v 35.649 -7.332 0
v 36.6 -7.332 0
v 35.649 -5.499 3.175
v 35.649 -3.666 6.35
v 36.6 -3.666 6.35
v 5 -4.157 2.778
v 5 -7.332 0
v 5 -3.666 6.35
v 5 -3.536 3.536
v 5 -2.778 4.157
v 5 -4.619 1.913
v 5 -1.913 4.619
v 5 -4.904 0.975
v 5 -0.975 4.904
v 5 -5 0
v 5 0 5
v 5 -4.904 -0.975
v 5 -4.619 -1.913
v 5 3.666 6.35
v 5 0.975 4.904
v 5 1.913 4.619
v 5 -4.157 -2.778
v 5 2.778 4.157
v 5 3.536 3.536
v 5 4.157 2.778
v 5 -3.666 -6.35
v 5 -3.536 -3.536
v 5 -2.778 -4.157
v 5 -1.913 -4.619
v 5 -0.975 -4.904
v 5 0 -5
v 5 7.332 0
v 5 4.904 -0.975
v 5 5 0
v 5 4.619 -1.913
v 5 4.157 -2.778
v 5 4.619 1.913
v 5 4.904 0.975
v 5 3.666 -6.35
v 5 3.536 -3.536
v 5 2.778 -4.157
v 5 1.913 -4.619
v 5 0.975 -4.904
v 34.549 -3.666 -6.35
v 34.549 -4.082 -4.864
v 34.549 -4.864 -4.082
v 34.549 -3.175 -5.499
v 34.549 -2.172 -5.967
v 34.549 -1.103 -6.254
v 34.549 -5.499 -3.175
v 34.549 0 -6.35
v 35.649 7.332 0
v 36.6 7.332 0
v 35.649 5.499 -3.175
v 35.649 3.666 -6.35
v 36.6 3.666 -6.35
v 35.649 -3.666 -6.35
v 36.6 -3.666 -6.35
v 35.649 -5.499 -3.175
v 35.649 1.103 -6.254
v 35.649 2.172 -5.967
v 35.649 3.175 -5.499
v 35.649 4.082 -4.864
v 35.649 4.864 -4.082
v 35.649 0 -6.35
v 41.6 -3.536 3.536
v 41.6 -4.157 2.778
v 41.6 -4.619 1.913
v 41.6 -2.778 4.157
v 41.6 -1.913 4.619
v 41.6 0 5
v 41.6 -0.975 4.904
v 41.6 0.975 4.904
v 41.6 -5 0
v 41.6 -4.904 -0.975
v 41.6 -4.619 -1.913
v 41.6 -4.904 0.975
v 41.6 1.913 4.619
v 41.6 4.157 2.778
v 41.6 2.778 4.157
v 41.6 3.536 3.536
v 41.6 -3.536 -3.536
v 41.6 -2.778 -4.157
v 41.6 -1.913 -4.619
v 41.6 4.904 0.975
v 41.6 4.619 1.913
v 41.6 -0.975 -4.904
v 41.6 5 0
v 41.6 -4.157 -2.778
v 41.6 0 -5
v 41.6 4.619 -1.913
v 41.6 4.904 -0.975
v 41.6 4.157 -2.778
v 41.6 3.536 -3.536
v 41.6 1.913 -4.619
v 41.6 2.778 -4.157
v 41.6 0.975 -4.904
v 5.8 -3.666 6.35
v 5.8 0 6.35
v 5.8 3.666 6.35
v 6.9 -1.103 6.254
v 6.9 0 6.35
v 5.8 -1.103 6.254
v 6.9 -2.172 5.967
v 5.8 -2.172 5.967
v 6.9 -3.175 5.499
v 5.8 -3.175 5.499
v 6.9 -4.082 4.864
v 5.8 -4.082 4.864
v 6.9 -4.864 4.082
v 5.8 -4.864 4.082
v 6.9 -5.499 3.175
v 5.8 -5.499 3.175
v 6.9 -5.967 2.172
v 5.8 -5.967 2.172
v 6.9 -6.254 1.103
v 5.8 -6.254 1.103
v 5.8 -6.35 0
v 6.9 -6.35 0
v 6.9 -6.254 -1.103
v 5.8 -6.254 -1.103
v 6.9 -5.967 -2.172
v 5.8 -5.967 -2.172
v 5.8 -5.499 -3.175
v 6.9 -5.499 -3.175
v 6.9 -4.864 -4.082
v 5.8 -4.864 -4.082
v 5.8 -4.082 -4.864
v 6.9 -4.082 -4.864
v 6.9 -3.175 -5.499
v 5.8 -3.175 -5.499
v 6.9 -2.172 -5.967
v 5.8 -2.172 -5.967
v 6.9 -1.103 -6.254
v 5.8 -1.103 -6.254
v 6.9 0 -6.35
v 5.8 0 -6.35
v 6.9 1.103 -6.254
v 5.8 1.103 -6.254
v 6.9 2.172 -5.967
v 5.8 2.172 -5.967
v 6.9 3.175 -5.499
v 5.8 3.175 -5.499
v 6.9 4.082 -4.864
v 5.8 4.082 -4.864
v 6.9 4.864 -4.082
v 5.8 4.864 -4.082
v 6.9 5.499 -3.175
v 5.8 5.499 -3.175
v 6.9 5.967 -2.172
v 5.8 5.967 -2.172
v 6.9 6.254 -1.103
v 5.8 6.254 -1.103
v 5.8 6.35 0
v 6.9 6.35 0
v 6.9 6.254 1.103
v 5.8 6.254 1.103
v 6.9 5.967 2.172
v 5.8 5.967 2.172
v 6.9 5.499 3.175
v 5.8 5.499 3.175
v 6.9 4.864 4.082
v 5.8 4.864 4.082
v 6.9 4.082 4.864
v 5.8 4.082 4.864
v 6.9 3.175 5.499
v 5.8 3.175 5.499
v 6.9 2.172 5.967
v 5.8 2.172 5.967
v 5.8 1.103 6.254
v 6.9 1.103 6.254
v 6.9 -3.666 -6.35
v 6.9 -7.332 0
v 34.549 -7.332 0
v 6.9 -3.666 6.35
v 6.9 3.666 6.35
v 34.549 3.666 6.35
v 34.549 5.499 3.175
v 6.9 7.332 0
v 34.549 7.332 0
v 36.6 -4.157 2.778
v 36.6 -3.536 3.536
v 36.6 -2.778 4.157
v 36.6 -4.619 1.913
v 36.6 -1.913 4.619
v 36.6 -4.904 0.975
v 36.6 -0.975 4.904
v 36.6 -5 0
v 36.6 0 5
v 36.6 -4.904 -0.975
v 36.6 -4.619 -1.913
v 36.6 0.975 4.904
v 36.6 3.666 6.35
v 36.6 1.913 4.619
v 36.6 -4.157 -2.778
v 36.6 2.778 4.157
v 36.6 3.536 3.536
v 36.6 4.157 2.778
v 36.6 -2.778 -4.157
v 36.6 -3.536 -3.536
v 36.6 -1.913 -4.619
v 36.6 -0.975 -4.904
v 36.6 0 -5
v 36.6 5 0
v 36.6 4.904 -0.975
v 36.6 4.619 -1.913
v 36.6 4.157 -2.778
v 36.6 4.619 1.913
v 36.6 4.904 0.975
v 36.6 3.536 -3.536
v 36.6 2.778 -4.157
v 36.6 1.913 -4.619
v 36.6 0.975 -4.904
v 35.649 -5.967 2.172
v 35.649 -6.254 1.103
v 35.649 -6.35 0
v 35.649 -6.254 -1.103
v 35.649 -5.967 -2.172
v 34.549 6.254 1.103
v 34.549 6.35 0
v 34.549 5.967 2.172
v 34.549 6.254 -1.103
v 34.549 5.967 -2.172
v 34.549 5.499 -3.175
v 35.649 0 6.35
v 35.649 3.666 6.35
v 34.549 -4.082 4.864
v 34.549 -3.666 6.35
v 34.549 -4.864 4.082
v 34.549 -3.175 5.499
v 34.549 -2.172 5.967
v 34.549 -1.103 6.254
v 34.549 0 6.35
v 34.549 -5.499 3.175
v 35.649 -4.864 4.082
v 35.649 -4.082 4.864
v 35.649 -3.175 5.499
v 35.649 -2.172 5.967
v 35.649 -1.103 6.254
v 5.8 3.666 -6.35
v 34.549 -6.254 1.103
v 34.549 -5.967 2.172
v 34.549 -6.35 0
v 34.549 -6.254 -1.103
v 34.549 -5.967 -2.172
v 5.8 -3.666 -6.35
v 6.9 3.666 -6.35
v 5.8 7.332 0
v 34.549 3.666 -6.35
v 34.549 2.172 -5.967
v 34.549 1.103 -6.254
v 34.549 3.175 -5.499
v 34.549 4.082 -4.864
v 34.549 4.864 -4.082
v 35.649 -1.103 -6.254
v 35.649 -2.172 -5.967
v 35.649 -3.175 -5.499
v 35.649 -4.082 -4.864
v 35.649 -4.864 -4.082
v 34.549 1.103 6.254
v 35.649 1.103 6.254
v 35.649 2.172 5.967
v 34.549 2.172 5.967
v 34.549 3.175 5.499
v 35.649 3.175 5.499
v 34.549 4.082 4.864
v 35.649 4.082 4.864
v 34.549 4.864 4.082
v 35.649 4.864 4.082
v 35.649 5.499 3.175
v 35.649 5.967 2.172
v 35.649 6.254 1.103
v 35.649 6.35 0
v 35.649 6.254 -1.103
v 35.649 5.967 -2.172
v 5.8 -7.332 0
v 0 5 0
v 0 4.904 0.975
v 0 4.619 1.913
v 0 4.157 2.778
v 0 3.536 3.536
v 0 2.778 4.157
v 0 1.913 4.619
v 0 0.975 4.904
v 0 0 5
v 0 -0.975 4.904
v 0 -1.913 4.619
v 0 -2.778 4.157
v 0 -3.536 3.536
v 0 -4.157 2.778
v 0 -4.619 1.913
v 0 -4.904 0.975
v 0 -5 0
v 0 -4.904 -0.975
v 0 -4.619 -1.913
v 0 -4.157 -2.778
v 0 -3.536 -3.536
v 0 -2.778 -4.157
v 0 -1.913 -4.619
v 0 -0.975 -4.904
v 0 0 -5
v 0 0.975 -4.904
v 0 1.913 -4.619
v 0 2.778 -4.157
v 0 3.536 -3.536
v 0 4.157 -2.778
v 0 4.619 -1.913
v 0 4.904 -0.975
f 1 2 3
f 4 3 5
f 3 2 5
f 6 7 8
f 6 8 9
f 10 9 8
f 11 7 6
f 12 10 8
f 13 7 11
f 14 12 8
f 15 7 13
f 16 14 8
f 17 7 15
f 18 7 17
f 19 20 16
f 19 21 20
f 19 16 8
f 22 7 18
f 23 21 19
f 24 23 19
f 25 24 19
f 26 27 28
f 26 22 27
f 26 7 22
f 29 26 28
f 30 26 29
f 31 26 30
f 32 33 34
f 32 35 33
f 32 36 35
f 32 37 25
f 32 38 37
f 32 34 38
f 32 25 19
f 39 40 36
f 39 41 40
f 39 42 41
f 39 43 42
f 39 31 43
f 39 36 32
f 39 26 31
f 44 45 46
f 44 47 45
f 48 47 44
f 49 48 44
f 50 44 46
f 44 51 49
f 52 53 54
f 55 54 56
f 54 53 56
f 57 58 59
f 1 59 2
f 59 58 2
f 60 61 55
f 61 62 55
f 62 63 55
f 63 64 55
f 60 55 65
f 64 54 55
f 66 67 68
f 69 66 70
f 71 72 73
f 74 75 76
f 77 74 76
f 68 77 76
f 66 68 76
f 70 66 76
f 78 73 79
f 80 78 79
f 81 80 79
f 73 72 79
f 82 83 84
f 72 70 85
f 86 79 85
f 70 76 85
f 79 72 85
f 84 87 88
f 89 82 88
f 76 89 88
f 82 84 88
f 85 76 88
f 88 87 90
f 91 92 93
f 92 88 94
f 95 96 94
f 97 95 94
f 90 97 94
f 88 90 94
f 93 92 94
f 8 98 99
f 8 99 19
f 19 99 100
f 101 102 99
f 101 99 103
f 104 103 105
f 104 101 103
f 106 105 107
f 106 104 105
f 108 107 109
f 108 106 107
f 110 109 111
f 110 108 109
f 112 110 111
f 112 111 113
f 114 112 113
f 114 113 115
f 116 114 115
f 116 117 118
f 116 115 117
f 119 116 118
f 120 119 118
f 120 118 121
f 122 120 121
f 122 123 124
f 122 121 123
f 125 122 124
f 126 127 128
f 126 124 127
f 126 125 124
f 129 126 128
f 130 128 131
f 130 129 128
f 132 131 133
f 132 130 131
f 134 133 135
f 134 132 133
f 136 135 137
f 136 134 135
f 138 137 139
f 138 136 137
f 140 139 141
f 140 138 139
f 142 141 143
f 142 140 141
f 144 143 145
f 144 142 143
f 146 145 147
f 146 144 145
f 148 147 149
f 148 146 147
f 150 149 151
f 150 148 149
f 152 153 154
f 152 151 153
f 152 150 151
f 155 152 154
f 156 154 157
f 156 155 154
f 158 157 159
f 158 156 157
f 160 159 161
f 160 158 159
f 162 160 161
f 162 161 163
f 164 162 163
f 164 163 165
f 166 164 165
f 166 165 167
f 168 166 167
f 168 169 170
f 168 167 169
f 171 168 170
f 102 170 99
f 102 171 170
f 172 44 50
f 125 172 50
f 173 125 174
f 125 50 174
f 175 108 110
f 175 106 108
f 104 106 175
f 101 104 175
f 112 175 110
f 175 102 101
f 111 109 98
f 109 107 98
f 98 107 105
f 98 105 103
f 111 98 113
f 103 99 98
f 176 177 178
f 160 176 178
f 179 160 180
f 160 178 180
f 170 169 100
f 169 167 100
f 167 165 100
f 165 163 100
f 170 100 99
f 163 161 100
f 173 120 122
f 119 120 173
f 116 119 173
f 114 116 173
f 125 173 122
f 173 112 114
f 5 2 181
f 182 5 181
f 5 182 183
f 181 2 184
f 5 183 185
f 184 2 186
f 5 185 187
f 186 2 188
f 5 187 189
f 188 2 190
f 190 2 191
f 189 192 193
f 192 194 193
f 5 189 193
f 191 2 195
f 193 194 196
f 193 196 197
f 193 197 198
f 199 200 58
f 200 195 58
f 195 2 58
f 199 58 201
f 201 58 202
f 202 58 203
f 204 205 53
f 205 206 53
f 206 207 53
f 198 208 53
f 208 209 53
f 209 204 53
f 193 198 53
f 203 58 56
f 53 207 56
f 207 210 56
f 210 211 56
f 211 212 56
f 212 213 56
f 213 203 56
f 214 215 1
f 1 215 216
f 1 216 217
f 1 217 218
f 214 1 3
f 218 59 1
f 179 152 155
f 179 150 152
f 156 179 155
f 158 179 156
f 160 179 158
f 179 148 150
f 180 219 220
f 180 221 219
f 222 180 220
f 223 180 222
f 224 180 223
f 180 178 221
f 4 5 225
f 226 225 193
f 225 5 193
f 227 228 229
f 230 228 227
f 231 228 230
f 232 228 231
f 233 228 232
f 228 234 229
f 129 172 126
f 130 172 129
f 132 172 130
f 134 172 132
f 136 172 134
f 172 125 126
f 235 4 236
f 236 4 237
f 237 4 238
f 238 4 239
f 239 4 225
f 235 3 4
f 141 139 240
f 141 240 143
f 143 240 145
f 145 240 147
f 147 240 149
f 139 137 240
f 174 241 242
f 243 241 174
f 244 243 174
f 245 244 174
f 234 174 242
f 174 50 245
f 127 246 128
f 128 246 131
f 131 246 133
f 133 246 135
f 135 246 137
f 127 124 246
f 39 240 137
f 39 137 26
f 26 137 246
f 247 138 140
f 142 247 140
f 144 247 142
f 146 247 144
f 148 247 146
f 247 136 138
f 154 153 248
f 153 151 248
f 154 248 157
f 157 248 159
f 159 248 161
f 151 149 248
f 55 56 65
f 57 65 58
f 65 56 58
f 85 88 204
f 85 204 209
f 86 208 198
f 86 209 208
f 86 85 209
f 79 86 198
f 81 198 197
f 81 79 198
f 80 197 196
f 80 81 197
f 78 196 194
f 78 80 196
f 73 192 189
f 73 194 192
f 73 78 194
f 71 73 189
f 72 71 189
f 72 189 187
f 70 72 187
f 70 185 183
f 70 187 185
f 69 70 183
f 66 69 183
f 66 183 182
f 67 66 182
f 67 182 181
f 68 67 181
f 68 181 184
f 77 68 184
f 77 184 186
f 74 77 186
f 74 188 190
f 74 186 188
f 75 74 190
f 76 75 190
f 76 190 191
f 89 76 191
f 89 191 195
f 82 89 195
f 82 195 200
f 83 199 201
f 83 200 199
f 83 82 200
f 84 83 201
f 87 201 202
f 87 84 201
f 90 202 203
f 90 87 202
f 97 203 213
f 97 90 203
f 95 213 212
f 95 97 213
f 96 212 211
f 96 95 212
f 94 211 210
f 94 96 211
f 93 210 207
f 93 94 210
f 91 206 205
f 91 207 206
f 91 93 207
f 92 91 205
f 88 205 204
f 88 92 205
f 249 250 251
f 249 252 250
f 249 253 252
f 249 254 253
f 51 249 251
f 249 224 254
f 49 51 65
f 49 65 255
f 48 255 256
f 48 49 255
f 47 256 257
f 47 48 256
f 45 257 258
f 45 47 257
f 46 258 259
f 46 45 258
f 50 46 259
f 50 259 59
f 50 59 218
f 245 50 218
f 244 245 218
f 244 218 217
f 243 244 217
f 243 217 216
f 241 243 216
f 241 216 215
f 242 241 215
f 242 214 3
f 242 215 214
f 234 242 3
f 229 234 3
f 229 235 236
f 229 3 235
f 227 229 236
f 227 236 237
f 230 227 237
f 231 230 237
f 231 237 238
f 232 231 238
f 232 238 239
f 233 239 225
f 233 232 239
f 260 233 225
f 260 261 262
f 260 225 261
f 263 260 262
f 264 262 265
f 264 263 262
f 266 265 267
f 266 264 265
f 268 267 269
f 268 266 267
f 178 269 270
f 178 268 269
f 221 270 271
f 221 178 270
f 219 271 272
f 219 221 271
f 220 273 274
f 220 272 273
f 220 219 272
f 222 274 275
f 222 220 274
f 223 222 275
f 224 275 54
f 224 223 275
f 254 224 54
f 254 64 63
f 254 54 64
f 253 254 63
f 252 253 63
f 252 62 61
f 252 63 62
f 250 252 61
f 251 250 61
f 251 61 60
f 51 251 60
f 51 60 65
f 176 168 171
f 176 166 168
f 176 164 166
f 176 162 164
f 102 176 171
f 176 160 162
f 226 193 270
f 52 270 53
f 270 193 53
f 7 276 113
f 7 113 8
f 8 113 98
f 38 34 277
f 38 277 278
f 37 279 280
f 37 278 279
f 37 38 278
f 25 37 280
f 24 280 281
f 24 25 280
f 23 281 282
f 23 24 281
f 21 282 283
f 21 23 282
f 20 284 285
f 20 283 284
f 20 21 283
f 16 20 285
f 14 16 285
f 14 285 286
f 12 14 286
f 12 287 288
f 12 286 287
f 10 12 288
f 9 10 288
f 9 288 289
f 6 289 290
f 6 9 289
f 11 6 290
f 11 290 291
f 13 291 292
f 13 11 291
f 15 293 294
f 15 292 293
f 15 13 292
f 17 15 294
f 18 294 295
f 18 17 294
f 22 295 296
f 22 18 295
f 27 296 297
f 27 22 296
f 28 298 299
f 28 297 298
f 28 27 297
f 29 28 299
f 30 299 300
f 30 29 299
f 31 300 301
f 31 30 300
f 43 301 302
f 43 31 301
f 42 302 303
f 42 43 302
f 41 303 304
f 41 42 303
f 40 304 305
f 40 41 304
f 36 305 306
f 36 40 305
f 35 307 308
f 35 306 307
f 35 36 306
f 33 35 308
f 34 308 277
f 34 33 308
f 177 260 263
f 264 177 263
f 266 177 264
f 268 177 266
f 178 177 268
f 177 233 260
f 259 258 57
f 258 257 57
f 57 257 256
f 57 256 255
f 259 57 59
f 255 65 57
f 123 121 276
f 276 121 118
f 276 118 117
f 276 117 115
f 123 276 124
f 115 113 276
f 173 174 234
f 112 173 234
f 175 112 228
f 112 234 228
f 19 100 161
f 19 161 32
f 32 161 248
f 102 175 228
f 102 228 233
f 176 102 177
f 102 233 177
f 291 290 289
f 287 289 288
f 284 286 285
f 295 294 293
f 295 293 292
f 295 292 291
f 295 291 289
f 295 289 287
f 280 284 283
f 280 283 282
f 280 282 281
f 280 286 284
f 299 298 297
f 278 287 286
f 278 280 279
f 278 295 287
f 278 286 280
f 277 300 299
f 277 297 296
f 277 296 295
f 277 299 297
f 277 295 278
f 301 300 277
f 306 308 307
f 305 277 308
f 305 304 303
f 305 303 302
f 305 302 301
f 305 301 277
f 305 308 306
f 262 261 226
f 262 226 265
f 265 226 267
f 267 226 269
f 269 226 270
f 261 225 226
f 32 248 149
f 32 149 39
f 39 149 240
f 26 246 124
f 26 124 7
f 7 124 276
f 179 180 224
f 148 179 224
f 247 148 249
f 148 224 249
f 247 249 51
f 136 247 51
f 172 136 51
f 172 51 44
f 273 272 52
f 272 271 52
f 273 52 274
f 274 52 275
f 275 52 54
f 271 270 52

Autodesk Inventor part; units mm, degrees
ref_plane "YZ Plane" through (0, 0, 0) normal (1, 0, 0) x (0, 1, 0)
sketch "Sketch1" plane through (0, 0, 0) normal (0, 0, 1) x (1, 0, 0)
  line L0 (0, 0) -> (0, 5)
  line L1 (0, 5) -> (5, 5)
  line L2 (5, 5) -> (5, 8.4186)
  line L3 (5, 8.4186) -> (36.6, 8.4186)
  line L4 (36.6, 8.4186) -> (36.6, 5)
  line L5 (36.6, 5) -> (41.6, 5)
  line L6 (41.6, 5) -> (41.6, 0)
  line L7 (41.6, 0) -> (0, 0)
  dimension "d0" = 31.6
  dimension "d1" = 5
  dimension "d2" = 5
  dimension "d3" = 5
revolve "Revolution1" add sketch "Sketch1" angle 360 about axis through (41.6, 0, 0) along (-1, 0, 0)
sketch "Sketch2" plane through (36.6, 0, 0) normal (1, 0, 0) x (0, 0, -1)
  circle A0 centre (0, 0) radius 5 projected
  line L0 (0, 7.3323) -> (6.35, 3.6662)
  line L1 (6.35, 3.6662) -> (6.35, -3.6662)
  line L2 (6.35, -3.6662) -> (0, -7.3323)
  line L3 (0, -7.3323) -> (-6.35, -3.6662)
  line L4 (-6.35, -3.6662) -> (-6.35, 3.6662)
  line L5 (-6.35, 3.6662) -> (0, 7.3323)
  circle A1 centre (0, 0) radius 5 projected
  circle A2 centre (0, 0) radius 8.4186 projected
  dimension "d5" = 12.7
extrude "Extrusion1" cut sketch "Sketch2" against normal up to surface (31.6 mm away) contours A2
ref_plane "Work Plane1" through (34.549, -3.6662, -6.35) normal (1, 0, 0) x (0, 0, -1)
sketch "Sketch3" plane through (34.549, -3.6662, -6.35) normal (1, 0, 0) x (0, 0, -1)
  circle A0 centre (-6.35, 3.6662) radius 5 projected
  circle A1 centre (-6.35, 3.6662) radius 6.35
  line L0 (0, 7.3323) -> (-6.35, 10.9985) projected
  circle A2 centre (-6.35, 3.6662) radius 5.85
  line L1 (-6.35, -3.6662) -> (0, 0) projected
  line L2 (0, 0) -> (0, 7.3323) projected
  line L3 (0, 7.3323) -> (-6.35, 10.9985) projected
  line L4 (-6.35, 10.9985) -> (-12.7, 7.3323) projected
  line L5 (-12.7, 7.3323) -> (-12.7, 0) projected
  line L6 (-12.7, 0) -> (-6.35, -3.6662) projected
  circle A3 centre (-6.35, 3.6662) radius 5 projected
  dimension "d9" = 0.5
extrude "Extrusion2" cut sketch "Sketch3" along normal blind 1.1 contours L2 L1 A1 | A1 L0 L2 | A1 L4 L0 | L1 L6 A1 | A1 L5 L4 | L6 L5 A1
ref_plane "Work Plane2" through (6.9, -3.6662, 6.35) normal (-1, 0, 0) x (0, 0, 1)
sketch "Sketch4" plane through (6.9, -3.6662, 6.35) normal (-1, 0, 0) x (0, 0, 1)
  line L0 (-12.7, 0) -> (-6.35, -3.6662) projected
  line L1 (-6.35, -3.6662) -> (0, 0) projected
  line L2 (0, 0) -> (0, 7.3323) projected
  line L3 (0, 7.3323) -> (-6.35, 10.9985) projected
  line L4 (-6.35, 10.9985) -> (-12.7, 7.3323) projected
  line L5 (-12.7, 7.3323) -> (-12.7, 0) projected
  circle A0 centre (-6.35, 3.6662) radius 5 projected
  circle A1 centre (-6.35, 3.6662) radius 5 projected
  circle A2 centre (-6.35, 3.6662) radius 6.35
extrude "Extrusion3" cut sketch "Sketch4" along normal blind 1.1 contours L5 A2 L0 | A2 L1 L0 | L5 L4 A2 | A2 L2 L1 | L4 L3 A2 | A2 L3 L2
properties part number "Hex Shaft 1" material "Steel, Mild"
